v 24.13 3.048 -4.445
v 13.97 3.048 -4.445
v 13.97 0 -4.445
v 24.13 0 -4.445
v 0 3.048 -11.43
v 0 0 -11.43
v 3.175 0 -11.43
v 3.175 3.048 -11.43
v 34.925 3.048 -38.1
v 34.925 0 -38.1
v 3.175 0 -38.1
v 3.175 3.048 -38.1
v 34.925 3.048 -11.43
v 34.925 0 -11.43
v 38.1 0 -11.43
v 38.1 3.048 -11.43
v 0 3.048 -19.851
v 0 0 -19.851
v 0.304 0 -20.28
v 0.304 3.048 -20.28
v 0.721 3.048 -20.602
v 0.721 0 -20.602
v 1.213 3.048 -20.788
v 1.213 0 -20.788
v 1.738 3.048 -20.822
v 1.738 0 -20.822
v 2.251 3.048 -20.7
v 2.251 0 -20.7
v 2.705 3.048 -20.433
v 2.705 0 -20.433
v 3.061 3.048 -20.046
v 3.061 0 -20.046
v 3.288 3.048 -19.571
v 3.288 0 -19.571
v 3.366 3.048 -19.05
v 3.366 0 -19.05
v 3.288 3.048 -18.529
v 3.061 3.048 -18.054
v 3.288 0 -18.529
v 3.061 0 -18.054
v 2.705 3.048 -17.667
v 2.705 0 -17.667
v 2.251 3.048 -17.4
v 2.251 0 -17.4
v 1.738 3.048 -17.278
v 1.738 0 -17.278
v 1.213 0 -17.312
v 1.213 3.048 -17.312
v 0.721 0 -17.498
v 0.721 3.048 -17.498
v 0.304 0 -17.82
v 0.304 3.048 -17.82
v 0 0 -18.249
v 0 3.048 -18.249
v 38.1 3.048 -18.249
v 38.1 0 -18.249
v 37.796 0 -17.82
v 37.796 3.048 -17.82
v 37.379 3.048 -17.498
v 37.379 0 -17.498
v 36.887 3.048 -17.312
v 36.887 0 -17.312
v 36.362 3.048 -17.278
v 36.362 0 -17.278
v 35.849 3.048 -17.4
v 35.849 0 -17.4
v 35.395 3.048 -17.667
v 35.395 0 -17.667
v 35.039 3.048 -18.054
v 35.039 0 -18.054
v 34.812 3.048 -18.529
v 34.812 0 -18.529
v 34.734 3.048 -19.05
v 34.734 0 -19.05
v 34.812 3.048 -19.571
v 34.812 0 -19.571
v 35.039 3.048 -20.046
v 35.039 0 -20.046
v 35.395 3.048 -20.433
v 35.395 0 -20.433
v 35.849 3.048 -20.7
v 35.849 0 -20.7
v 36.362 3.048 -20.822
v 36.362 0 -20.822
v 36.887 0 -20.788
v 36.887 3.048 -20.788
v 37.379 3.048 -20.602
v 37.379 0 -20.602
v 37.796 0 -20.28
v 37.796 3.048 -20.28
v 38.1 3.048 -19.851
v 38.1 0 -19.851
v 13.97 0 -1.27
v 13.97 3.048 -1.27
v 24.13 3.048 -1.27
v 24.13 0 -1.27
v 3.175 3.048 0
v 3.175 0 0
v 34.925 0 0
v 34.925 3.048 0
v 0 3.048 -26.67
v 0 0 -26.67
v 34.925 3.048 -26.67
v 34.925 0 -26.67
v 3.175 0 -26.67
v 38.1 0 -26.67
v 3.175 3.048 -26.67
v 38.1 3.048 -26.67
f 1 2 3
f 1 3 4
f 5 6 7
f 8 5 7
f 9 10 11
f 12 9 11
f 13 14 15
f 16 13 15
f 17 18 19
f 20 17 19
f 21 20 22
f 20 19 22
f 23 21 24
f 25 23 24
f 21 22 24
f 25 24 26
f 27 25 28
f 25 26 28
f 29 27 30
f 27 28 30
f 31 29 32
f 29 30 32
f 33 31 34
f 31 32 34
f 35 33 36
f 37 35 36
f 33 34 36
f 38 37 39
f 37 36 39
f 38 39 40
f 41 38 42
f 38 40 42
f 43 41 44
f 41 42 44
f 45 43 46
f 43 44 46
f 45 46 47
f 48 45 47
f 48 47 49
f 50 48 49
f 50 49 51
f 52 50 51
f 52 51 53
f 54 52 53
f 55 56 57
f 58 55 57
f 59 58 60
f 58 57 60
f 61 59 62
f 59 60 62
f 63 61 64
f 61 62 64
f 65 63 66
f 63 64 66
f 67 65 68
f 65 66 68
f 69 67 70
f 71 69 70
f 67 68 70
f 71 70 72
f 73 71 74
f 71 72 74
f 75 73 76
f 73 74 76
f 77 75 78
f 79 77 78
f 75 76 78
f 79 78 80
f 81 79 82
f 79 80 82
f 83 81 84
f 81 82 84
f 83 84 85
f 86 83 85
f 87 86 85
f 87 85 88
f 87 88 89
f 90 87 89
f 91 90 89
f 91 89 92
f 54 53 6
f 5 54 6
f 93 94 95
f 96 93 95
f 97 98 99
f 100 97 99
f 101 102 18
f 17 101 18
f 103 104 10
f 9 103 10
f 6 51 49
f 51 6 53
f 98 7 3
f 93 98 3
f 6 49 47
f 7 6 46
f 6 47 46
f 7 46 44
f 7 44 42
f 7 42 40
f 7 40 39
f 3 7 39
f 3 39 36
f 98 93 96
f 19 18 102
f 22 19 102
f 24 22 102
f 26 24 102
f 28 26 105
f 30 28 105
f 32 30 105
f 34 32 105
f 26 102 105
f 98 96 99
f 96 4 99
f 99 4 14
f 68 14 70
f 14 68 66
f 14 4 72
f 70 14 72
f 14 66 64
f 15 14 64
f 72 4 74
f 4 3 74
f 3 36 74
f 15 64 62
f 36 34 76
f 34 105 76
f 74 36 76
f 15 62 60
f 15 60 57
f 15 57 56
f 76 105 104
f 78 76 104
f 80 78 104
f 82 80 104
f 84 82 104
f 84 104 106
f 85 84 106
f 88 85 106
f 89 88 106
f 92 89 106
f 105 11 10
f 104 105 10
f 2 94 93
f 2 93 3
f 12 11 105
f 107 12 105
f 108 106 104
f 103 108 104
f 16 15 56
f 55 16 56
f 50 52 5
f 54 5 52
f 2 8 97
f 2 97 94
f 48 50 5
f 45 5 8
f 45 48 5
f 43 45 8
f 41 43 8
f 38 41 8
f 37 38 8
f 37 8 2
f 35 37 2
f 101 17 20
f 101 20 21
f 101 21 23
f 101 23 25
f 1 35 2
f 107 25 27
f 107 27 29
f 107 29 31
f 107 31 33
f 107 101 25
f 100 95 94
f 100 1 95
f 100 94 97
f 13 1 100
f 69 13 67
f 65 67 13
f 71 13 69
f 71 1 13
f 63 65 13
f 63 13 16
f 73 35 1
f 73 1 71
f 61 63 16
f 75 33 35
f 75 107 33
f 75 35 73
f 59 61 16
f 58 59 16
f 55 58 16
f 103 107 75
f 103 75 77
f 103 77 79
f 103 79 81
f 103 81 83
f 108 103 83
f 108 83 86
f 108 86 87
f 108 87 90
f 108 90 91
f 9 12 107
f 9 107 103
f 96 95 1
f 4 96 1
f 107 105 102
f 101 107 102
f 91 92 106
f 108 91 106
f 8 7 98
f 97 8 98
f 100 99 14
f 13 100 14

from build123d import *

# Parameters (mm, degrees)
BOSS_EXTRUDE1_DEPTH = 3.048
SKETCH2_W           = 10.16
SKETCH2_H           = 3.175
CUT_EXTRUDE1_DEPTH  = 54.967678327


with BuildPart() as part:
    # Sketch1 → Boss-Extrude1 (new body)
    with BuildSketch(Plane(origin=(0, 0, 0), x_dir=(1, 0, 0), z_dir=(0, 1, 0))):
        with BuildLine():
            Line((3.175, 38.1), (3.175, 26.67))
            Line((3.175, 26.67), (0, 26.67))
            Line((0, 26.67), (0, 19.850704534))
            ThreePointArc((0, 19.850704534), (3.3655, 19.05), (0, 18.249295466))
            Line((0, 18.249295466), (0, 11.43))
            Line((0, 11.43), (3.175, 11.43))
            Line((3.175, 11.43), (3.175, 0))
            Line((3.175, 0), (34.925, 0))
            Line((34.925, 0), (34.925, 11.43))
            Line((34.925, 11.43), (38.1, 11.43))
            Line((38.1, 11.43), (38.1, 18.249295466))
            ThreePointArc((38.1, 18.249295466), (34.7345, 19.05), (38.1, 19.850704534))
            Line((38.1, 19.850704534), (38.1, 26.67))
            Line((38.1, 26.67), (34.925, 26.67))
            Line((34.925, 26.67), (34.925, 38.1))
            Line((34.925, 38.1), (3.175, 38.1))
        make_face()
    extrude(amount=BOSS_EXTRUDE1_DEPTH)

    # Sketch2 → Cut-Extrude1 (cut, through all)
    with BuildSketch(Plane(origin=(0, 3.048, 0), x_dir=(1, 0, 0), z_dir=(0, 1, 0))):
        with Locations((19.05, 2.8575)):
            Rectangle(SKETCH2_W, SKETCH2_H)
    extrude(amount=-CUT_EXTRUDE1_DEPTH, mode=Mode.SUBTRACT)


solid = part.part
